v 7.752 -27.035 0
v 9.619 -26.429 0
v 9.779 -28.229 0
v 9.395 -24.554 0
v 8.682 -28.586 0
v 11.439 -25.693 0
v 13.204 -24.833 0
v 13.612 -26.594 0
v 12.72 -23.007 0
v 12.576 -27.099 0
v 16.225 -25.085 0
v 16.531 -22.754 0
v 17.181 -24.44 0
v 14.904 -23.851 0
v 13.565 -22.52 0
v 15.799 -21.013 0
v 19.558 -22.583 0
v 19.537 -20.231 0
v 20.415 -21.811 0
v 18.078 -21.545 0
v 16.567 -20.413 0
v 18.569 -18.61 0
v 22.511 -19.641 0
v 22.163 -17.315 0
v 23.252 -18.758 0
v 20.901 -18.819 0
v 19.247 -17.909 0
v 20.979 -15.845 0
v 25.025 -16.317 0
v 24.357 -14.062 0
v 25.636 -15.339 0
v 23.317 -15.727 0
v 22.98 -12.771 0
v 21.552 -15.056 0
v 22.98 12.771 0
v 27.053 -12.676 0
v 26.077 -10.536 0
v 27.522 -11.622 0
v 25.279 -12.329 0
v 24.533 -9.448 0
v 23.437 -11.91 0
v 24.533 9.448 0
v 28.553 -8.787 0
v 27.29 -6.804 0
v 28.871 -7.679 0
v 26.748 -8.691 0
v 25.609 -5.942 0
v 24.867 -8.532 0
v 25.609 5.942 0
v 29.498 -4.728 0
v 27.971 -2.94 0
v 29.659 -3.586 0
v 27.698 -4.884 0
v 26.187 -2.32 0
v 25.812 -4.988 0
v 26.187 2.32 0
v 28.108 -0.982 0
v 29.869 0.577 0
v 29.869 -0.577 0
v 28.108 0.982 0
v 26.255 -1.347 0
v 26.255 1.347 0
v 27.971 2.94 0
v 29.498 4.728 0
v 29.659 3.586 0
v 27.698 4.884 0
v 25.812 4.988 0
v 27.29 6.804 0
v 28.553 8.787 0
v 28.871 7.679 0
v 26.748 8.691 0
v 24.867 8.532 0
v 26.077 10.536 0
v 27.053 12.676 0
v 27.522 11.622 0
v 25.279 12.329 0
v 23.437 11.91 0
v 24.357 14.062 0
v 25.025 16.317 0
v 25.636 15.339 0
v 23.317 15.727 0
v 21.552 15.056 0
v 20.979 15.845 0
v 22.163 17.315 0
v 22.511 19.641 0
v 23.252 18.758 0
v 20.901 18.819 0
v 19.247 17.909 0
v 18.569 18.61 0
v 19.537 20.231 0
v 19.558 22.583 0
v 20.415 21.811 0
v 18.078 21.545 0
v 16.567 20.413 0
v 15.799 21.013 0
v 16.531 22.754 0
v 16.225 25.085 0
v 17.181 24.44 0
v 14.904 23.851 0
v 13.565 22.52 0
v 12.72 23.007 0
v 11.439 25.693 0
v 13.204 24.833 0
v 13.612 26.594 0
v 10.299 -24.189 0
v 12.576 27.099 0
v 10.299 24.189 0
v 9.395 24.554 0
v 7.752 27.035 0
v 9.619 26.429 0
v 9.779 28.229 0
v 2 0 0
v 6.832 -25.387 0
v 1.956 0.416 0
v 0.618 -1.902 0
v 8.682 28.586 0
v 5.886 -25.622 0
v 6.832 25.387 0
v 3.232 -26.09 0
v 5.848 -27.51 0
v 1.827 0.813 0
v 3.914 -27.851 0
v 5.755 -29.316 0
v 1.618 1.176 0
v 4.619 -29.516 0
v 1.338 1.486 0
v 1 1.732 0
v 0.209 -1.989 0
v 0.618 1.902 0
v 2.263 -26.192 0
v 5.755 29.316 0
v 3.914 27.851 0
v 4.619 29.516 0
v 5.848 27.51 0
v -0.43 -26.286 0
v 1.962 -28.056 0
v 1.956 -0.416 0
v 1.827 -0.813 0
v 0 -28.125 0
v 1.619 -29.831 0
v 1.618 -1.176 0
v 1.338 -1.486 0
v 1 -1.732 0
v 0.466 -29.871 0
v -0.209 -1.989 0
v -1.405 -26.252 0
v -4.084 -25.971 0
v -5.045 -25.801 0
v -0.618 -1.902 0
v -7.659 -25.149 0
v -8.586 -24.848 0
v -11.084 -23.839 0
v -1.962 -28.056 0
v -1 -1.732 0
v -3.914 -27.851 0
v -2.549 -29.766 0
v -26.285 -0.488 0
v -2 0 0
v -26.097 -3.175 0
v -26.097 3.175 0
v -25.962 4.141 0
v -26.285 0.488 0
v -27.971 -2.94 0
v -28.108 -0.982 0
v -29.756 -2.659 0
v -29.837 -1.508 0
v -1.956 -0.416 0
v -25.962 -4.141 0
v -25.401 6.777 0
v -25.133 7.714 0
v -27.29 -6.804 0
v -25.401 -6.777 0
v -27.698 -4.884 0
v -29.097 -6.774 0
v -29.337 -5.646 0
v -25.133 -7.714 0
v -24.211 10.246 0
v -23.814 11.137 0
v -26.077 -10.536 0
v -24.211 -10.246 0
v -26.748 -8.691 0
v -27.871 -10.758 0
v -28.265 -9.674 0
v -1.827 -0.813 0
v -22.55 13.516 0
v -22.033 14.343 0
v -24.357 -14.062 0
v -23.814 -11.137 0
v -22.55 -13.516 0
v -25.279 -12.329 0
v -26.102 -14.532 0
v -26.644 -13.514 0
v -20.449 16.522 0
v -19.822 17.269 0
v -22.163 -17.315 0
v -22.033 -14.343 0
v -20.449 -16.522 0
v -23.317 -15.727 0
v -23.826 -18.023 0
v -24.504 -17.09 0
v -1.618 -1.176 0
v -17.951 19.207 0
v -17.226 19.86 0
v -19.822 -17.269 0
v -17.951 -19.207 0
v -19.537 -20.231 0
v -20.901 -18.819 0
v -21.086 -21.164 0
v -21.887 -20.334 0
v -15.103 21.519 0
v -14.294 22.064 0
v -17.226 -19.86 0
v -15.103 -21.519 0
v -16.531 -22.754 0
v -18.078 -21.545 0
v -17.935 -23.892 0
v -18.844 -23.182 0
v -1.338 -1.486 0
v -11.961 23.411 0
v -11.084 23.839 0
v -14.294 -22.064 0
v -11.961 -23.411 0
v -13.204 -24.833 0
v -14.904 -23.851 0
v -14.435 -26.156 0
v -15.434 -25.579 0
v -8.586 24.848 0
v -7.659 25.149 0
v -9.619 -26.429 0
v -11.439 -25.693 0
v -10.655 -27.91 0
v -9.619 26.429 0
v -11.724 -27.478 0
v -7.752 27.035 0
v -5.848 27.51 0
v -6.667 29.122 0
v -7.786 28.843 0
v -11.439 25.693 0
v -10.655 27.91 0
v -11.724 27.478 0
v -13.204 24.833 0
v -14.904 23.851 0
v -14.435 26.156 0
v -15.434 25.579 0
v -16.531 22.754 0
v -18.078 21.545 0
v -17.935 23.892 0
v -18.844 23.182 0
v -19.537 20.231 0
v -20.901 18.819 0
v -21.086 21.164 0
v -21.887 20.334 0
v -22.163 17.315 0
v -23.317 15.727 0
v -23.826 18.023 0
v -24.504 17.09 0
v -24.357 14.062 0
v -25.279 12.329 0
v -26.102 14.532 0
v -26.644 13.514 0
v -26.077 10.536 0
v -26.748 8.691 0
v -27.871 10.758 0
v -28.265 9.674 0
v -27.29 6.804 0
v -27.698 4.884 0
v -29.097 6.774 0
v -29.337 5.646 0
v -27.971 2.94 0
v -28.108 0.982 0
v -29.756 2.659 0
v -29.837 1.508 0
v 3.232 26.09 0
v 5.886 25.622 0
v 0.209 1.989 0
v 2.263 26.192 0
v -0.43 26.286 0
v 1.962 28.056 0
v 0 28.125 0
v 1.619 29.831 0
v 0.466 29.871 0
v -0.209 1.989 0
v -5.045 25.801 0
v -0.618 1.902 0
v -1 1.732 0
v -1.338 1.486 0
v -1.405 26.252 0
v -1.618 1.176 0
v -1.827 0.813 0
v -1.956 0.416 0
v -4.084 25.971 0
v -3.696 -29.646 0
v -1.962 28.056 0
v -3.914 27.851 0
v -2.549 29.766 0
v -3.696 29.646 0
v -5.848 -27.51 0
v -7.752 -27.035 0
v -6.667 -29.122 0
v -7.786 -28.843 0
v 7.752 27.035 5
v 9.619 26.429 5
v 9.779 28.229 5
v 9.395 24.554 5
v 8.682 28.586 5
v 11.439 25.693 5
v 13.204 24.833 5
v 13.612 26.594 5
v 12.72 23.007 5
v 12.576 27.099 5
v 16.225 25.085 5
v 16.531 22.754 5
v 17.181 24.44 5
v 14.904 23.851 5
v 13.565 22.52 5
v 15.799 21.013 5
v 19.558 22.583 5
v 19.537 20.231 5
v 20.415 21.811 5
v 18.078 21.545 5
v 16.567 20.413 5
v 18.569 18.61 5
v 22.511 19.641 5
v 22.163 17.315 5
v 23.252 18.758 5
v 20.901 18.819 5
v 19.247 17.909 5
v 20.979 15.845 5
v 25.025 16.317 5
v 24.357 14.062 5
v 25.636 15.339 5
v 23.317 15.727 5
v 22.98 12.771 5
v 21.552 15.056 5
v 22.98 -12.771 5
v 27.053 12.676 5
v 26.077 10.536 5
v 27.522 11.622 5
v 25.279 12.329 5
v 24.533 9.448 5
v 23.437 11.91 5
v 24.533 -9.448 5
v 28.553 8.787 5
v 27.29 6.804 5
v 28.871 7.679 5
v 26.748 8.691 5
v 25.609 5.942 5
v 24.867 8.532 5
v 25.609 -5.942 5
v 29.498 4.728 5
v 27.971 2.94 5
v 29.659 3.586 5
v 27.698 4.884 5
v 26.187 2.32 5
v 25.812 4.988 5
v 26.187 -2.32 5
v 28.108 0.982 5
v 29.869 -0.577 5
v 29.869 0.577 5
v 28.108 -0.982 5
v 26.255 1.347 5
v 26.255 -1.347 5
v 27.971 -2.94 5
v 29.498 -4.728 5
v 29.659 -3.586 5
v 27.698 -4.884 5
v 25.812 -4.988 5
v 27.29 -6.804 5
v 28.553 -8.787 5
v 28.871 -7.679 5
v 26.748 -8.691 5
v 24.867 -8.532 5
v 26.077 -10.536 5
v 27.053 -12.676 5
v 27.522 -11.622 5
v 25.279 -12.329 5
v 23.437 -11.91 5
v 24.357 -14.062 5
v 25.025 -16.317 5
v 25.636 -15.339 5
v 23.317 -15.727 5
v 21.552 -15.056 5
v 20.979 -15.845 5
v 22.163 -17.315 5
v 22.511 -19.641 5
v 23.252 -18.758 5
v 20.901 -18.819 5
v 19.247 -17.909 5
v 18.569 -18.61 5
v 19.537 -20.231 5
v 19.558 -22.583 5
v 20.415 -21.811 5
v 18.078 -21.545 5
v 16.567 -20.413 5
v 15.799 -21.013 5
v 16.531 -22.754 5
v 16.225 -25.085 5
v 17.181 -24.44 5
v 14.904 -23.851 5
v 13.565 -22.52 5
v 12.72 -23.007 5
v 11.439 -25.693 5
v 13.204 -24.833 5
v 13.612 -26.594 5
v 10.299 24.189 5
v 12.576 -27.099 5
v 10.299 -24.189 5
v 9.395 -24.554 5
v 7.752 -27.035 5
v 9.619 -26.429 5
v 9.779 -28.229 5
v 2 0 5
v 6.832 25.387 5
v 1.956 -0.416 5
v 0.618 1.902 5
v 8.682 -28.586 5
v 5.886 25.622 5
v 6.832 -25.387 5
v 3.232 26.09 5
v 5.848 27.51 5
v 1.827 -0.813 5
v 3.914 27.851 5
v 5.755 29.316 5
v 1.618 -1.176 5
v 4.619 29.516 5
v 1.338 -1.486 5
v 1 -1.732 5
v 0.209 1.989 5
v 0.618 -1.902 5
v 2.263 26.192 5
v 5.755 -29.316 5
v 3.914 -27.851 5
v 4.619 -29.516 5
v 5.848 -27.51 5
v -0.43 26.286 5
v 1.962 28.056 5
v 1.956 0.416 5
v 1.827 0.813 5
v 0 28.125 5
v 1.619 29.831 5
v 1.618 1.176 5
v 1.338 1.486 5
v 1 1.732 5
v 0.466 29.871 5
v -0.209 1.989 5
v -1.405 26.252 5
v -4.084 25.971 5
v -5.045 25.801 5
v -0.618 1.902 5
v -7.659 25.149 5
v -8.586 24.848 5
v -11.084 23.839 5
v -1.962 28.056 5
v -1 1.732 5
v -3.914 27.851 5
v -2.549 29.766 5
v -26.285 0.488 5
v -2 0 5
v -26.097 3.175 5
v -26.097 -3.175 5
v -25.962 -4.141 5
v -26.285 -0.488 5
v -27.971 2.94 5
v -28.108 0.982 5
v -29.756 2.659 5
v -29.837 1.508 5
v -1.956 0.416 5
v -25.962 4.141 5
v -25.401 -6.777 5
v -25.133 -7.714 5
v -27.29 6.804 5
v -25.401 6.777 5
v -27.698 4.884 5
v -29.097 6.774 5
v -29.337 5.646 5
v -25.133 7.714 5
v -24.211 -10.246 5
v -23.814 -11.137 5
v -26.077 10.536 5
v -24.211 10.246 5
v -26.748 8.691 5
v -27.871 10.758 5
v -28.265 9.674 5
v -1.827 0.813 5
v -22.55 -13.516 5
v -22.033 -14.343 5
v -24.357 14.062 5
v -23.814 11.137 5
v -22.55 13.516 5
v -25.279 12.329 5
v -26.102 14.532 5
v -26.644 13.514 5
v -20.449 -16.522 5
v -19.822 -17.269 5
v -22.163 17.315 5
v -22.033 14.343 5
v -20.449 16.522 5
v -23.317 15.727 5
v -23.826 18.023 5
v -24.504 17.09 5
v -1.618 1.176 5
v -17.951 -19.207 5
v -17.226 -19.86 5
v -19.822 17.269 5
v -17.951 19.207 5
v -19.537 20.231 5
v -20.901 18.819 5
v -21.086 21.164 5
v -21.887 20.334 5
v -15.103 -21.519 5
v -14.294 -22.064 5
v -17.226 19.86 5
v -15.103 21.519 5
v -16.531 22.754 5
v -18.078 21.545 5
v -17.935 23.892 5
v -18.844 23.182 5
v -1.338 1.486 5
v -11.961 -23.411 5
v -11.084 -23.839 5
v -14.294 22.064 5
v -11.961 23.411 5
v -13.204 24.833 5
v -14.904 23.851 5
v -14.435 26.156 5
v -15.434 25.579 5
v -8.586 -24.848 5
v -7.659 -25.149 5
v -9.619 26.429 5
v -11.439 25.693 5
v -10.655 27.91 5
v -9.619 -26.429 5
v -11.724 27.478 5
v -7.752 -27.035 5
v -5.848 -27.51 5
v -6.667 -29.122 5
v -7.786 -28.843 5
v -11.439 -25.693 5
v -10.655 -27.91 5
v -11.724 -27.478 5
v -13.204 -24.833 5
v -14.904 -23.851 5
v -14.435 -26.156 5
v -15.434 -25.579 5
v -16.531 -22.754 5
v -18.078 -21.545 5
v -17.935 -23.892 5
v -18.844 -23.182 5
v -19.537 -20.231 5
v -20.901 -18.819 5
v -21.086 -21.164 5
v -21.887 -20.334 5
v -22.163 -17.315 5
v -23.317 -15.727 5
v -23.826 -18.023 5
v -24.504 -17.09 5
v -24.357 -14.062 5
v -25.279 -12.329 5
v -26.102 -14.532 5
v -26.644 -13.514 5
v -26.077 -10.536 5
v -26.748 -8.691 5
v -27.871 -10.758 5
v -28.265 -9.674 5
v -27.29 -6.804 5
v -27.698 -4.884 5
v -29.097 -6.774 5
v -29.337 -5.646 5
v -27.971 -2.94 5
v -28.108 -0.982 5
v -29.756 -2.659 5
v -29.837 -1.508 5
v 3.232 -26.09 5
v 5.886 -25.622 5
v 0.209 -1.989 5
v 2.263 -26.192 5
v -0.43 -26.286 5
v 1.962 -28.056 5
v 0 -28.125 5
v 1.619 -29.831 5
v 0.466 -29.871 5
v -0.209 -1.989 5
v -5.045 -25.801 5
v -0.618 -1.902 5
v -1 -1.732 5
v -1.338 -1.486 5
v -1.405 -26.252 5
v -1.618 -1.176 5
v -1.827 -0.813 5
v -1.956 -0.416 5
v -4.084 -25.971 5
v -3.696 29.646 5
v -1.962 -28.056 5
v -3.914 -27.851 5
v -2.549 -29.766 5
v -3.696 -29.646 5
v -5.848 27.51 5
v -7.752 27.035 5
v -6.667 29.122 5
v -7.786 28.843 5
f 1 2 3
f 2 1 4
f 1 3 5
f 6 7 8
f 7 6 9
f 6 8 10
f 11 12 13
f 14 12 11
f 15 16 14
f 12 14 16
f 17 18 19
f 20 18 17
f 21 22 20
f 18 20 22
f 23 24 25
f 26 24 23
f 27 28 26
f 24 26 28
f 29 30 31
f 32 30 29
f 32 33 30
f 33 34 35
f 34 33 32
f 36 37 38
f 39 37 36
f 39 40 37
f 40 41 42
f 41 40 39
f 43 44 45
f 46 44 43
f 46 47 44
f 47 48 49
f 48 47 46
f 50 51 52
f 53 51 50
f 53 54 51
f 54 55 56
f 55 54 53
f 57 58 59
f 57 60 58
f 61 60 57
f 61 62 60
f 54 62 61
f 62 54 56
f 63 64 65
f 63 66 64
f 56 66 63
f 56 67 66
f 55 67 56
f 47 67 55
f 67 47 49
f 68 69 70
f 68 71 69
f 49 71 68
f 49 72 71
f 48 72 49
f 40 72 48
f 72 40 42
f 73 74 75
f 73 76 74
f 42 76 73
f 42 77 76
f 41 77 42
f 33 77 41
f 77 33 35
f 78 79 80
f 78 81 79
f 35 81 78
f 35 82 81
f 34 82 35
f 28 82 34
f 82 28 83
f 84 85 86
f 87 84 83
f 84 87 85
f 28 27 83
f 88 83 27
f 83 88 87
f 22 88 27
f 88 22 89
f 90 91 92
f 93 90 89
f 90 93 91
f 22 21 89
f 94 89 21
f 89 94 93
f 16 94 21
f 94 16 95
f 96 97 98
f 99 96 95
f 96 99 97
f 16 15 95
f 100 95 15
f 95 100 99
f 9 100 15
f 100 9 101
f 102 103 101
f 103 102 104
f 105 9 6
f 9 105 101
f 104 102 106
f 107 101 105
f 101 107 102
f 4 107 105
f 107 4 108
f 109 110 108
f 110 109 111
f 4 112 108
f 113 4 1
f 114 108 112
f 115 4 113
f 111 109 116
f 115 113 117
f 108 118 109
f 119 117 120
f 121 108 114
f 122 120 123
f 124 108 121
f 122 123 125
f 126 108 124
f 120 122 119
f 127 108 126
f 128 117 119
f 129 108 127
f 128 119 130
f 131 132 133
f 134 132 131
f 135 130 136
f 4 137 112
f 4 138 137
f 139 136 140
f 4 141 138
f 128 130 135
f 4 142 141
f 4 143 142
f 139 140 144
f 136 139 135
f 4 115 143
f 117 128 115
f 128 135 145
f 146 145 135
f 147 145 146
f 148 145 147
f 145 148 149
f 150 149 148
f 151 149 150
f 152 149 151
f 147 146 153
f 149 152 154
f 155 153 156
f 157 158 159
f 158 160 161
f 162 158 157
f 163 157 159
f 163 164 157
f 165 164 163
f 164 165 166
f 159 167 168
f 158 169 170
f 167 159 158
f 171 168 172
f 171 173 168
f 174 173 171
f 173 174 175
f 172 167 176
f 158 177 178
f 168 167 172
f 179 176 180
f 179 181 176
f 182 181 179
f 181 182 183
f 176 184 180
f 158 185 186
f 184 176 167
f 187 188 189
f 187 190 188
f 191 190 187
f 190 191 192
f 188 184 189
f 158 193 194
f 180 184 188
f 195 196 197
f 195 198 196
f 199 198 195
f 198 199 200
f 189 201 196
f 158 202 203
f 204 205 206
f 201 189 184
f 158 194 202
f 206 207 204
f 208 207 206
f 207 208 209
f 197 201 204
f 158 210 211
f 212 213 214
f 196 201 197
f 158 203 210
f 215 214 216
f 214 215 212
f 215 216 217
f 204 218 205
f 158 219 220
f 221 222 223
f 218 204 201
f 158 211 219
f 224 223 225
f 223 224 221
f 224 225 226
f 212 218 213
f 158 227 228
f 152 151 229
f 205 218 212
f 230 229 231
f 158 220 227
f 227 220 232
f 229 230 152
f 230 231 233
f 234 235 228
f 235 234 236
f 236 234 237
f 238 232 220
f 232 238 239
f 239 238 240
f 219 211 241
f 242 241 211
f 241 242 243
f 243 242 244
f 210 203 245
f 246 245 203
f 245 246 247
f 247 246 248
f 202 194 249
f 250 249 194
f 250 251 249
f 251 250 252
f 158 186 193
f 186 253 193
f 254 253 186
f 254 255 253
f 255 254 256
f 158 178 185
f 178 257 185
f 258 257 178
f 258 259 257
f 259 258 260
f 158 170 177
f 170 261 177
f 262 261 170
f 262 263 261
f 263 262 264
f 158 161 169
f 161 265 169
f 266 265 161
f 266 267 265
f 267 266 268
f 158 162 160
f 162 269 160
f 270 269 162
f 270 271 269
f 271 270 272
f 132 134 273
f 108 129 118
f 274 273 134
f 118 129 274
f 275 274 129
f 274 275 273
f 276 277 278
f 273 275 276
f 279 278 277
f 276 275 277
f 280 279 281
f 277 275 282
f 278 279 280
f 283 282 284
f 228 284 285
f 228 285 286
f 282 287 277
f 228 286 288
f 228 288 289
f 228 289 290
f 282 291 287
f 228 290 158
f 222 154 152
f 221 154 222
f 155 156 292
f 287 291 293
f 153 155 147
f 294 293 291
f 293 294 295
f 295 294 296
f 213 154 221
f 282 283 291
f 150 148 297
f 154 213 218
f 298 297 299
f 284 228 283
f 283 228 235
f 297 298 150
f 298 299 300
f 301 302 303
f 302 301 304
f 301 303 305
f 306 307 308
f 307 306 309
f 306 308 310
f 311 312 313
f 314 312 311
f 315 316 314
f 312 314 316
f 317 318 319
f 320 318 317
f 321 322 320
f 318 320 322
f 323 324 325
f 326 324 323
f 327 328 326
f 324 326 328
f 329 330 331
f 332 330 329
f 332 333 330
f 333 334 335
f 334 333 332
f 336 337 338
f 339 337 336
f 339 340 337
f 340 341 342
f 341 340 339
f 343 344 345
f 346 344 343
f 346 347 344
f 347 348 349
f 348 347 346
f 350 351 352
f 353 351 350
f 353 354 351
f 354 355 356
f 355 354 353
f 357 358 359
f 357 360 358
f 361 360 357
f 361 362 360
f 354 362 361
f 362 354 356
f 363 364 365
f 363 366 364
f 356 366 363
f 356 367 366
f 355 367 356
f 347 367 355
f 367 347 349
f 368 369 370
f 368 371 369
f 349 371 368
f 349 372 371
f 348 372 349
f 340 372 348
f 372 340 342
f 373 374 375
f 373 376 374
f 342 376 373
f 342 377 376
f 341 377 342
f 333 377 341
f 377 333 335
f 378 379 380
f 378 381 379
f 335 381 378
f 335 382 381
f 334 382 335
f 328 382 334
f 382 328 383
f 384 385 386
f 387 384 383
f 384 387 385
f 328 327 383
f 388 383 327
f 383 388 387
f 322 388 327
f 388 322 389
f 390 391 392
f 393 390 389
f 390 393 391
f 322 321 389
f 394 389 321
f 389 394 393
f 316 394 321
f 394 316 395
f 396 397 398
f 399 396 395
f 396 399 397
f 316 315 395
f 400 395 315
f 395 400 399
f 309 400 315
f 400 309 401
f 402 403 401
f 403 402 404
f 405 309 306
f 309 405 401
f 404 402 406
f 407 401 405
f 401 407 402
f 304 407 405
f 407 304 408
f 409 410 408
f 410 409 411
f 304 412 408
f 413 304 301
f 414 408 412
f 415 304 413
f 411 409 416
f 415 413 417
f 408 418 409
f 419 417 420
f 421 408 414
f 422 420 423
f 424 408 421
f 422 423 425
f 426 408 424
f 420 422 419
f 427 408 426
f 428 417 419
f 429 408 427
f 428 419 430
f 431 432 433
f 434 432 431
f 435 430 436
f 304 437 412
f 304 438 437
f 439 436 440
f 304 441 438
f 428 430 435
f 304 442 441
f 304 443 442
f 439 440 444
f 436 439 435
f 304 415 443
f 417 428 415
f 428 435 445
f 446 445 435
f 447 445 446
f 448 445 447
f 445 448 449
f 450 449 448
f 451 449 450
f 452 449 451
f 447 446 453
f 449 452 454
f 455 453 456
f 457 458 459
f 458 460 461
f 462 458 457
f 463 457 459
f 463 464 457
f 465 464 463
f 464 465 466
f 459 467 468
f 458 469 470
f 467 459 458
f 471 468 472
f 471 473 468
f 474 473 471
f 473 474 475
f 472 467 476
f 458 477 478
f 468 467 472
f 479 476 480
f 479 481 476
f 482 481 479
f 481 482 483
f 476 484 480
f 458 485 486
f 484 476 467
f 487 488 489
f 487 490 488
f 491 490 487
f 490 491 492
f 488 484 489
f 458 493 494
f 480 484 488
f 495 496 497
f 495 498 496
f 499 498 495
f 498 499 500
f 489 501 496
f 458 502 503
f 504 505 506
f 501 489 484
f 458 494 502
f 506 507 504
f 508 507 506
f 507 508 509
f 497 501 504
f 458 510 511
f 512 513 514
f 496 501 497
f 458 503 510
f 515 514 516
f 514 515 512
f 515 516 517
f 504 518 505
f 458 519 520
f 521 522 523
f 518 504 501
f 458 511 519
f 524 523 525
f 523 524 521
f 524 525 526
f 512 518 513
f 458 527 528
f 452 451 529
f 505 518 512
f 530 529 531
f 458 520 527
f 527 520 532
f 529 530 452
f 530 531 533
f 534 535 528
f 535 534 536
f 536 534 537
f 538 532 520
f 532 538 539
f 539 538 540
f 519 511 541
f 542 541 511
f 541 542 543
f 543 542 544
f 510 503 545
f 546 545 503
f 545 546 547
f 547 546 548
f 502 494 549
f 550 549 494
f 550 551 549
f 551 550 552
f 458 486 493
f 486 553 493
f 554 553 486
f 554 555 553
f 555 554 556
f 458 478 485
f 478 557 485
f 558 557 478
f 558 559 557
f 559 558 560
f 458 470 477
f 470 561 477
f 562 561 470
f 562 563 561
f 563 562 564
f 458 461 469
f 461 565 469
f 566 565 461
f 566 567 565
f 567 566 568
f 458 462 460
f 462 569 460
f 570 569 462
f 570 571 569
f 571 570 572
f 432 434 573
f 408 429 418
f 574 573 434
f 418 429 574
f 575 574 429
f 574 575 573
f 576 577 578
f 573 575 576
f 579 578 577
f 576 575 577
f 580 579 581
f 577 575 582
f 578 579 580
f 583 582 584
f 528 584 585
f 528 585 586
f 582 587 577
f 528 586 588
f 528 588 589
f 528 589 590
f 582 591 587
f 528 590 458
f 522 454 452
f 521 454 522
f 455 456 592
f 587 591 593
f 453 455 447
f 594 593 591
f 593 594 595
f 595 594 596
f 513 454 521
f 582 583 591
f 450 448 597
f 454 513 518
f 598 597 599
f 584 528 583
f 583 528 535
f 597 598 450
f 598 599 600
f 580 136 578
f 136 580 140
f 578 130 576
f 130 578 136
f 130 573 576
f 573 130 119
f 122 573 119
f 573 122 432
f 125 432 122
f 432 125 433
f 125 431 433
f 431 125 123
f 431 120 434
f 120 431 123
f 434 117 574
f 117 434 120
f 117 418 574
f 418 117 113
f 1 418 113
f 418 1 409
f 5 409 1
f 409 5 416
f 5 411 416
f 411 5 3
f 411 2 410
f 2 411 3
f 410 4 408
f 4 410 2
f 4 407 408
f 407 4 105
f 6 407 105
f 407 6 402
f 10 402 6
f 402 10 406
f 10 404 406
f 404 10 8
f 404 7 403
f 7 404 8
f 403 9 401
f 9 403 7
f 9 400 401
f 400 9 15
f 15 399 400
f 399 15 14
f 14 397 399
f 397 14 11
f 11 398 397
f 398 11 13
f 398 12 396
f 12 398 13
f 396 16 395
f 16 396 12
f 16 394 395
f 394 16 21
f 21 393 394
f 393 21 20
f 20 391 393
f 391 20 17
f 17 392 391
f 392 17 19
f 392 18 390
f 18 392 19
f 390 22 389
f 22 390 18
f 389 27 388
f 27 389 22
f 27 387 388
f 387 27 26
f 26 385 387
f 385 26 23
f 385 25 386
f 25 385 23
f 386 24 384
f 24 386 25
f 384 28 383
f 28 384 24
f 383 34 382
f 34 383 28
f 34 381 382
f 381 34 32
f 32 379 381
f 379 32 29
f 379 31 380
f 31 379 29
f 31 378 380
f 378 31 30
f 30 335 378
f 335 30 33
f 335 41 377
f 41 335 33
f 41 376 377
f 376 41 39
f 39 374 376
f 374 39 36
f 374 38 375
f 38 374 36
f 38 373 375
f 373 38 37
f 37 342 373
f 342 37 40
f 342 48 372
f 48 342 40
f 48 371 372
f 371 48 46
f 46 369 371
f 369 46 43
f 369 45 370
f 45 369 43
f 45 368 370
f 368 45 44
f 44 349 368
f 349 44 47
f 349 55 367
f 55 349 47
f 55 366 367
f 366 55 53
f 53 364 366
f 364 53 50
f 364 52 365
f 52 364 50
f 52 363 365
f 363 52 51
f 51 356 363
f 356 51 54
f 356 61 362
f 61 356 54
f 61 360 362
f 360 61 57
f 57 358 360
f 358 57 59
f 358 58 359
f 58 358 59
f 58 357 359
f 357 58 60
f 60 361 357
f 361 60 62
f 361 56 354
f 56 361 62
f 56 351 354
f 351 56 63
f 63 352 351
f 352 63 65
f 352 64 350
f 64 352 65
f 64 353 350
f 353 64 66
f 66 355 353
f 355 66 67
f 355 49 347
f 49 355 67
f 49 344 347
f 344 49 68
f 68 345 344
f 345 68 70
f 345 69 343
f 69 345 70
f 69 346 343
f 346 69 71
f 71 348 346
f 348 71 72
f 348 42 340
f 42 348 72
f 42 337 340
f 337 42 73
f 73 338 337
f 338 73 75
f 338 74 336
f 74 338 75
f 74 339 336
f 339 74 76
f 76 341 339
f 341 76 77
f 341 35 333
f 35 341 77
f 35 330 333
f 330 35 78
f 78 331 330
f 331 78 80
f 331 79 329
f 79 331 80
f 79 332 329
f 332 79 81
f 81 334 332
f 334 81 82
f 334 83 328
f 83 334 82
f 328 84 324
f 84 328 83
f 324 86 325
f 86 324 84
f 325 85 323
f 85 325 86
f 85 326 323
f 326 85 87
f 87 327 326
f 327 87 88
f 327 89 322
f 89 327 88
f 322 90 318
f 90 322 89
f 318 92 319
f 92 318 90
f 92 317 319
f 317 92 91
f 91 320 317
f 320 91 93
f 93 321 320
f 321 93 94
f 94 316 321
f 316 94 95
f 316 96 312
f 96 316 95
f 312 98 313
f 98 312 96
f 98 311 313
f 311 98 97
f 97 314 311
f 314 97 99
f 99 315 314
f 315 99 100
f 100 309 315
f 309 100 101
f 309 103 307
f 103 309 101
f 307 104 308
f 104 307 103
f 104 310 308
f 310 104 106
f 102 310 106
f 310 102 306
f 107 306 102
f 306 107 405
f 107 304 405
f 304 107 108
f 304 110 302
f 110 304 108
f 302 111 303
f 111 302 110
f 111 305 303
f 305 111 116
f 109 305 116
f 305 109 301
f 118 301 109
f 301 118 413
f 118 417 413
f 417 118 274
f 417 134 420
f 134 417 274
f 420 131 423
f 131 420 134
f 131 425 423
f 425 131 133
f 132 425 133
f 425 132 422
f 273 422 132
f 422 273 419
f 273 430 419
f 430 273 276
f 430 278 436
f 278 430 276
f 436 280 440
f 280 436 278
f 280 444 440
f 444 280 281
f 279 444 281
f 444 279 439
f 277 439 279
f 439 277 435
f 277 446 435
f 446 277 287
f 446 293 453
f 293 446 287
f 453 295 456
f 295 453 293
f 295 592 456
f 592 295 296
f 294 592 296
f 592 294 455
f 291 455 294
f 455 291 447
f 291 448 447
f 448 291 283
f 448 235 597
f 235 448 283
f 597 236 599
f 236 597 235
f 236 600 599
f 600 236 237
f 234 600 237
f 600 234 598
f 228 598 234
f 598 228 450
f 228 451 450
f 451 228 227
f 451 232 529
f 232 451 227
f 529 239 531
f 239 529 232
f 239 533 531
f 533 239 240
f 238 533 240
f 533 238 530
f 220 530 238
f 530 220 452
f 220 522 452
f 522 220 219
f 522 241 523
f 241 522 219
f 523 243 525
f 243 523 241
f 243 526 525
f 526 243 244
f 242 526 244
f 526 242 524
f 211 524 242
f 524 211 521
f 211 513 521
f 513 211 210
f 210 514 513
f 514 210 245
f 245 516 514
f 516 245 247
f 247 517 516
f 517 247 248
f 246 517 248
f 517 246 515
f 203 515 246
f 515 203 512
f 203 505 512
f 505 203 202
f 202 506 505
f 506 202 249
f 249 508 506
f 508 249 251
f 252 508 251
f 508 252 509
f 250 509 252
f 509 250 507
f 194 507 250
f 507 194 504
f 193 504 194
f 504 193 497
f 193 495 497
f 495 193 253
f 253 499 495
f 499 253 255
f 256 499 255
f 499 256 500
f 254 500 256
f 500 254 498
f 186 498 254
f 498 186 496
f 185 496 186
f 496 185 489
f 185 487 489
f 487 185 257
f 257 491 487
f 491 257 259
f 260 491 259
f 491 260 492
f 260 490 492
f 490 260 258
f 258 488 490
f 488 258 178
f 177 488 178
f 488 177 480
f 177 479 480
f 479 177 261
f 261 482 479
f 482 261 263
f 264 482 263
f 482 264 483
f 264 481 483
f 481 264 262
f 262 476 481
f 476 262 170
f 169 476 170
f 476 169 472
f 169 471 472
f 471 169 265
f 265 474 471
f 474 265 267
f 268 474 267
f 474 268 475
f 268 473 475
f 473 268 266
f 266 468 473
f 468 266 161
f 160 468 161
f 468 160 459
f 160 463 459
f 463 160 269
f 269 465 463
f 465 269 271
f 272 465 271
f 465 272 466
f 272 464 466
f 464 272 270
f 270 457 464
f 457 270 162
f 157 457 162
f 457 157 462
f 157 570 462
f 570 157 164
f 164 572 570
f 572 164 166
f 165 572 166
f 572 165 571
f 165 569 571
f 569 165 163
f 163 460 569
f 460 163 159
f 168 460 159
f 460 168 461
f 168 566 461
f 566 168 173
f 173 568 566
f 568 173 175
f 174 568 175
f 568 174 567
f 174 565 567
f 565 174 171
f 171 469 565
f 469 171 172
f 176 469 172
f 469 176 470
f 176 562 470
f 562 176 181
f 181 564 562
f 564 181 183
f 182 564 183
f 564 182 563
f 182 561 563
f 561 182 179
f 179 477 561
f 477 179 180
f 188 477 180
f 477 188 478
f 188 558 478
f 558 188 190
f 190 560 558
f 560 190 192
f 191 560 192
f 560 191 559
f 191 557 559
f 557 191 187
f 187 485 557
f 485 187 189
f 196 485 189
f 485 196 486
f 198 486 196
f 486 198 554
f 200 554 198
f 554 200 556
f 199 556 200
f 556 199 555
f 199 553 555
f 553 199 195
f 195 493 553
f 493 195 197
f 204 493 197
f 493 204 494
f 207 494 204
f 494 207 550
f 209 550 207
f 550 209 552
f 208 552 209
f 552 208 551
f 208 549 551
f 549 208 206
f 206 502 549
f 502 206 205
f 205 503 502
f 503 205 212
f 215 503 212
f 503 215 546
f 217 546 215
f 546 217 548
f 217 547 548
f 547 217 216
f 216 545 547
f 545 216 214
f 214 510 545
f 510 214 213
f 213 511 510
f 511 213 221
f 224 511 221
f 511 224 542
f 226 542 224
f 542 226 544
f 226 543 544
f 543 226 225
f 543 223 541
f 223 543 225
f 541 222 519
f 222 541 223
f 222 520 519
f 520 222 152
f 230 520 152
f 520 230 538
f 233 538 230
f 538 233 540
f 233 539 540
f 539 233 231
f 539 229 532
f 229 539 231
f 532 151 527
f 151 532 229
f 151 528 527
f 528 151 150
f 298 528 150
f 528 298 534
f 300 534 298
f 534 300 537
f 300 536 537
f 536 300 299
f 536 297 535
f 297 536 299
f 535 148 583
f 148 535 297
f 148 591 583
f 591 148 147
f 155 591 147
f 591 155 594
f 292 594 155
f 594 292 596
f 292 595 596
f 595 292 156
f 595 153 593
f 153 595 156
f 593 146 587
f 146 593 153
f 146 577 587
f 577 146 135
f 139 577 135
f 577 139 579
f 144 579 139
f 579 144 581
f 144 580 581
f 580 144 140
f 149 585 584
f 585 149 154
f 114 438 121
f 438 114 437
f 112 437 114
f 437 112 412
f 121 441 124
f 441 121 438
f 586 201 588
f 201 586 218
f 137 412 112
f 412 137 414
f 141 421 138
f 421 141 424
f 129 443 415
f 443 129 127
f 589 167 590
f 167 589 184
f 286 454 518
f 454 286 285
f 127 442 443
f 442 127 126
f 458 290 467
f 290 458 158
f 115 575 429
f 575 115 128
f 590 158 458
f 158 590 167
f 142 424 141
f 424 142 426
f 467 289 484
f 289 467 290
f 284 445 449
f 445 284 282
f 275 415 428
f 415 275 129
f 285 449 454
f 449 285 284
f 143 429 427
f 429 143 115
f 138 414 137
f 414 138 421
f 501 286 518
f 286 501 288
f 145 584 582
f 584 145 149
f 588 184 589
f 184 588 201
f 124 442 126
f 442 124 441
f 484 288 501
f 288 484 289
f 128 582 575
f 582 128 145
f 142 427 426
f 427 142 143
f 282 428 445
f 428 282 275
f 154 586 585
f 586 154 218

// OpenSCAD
/*---------------------------------------------------------\
|     From: Ekobots Innovation Ltda - www.ekobots.com      |
|       by: Juan Sirgado y Antico - www.jsya.com.br        |
|----------------------------------------------------------|
|               Program Gear - 2014/04/10                  |
|               All rights reserved 2014                   |
|---------------------------------------------------------*/
gear();
//---------------------------------------------------------|
module gear
(
   // Gear parameters
   num_teeth = 45,  // Number of teeth
   gearHeight = 5, //Height of the gear    

   // Central Hole
   holes_num = 1,   // Central hole (1-Hole 0-No hole)
   hole_radius = 2, // Radius of central hole

   // Tooth parameters
   circ_pitch = false, // Circular pitch
   diam_pitch = .8,    // Diametral pitch
   pres_angle = 86,    // Pressure angle
   tooth_clear = .1    // Clearance
)
{
   difference() 
	{
   	linear_extrude(height = gearHeight, 
							center = false, 
							convexity = 10, 
							twist = 0) 
		{
         // Make the gear
      	make_gear(number_of_teeth = num_teeth,
        	          circular_pitch = circ_pitch,
        			    diametral_pitch = diam_pitch, 
        			    pressure_angle = pres_angle, 
        			    clearance = tooth_clear);
		}
		if (holes_num > 0) 
 	   {
      // Cut the central hole
      translate([0, 0, -.1]) 
         cylinder(r=hole_radius, h=gearHeight+.2, $fs=0.1);
   	}
   }
}
//---------------------------------------------------------|
module make_gear(number_of_teeth=20,
                 circular_pitch=false, 
                 diametral_pitch=false,
                 pressure_angle=20, 
                 clearance = 1)
{
  if (circular_pitch == false && diametral_pitch == false) 
     echo("ERROR: diametral_pitch and circular_pitch not valid");
  
  //Convert diametrial pitch to our native circular pitch
  circular_pitch = (circular_pitch != false ? circular_pitch : 180 / diametral_pitch);
  
  // Pitch diameter: Diameter of pitch circle.
  pitch_diameter  =  number_of_teeth * circular_pitch / 180;
  pitch_radius = pitch_diameter / 2;
  
  // Base Circle
  base_diameter = pitch_diameter * cos(pressure_angle);
  base_radius = base_diameter / 2;

  // Diametrial pitch: Number of teeth per unit length.
  pitch_diametrial = number_of_teeth / pitch_diameter;

  // Addendum: Radial distance from pitch circle to outside circle.
  addendum = 1.4 / pitch_diametrial;
  
  //Outer Circle
  outer_radius = pitch_radius + addendum;
  outer_diameter = outer_radius * 2;
  
  // Dedendum: Radial distance from pitch circle to root diameter
  dedendum = addendum + clearance;

  // Root diameter: Diameter of bottom of tooth spaces.
  root_radius = pitch_radius - dedendum;
  root_diameter = root_radius * 2;
  
  half_thick_angle = 360 / (4 * number_of_teeth);
  
  union() {
    rotate(half_thick_angle)
      circle($fn=number_of_teeth * 2, r=root_radius * 1.001);
    
    for (i = [1 : number_of_teeth]) 
    {  //for (i = [0])
      rotate([0,0, i * 360 / number_of_teeth]) 
      {
        involute_gear_tooth(pitch_radius = pitch_radius,
                            root_radius = root_radius,
                            base_radius = base_radius,
                            outer_radius = outer_radius,
                            half_thick_angle = half_thick_angle);
      } // end of rotate
    } // end of for
  } // end of union
}
//---------------------------------------------------------|
module involute_gear_tooth(pitch_radius,
                           root_radius,
                           base_radius,
                           outer_radius,
                           half_thick_angle)
{
   pitch_to_base_angle  = involute_intersect_angle( base_radius, pitch_radius );
   outer_to_base_angle = involute_intersect_angle( base_radius, outer_radius );
   
   base1 = 0 - pitch_to_base_angle - half_thick_angle;
   pitch1 = 0 - half_thick_angle;
   outer1 = outer_to_base_angle - pitch_to_base_angle - half_thick_angle;
   
   b1 = polar_to_cartesian([ base1, base_radius ]);
   p1 = polar_to_cartesian([ pitch1, pitch_radius ]);
   o1 = polar_to_cartesian([ outer1, outer_radius ]);
   
   b2 = polar_to_cartesian([ -base1, base_radius ]);
   p2 = polar_to_cartesian([ -pitch1, pitch_radius ]);
   o2 = polar_to_cartesian([ -outer1, outer_radius ]);
   
   pitch_to_root_angle = pitch_to_base_angle - 
                         involute_intersect_angle(base_radius, root_radius );

   // set up values for ( root_radius > base_radius ) case
   root1 = pitch1 - pitch_to_root_angle;   

   r1_t =  polar_to_cartesian([ root1, root_radius ]);
   r2_t =  polar_to_cartesian([ -root1, root_radius ]);
  
   // set up values for ( else ) case
   r1_f =  polar_to_cartesian([ base1, root_radius ]);
   r2_f =  polar_to_cartesian([ -base1, root_radius ]);
  
   if (root_radius > base_radius) 
   {
      polygon( points = [b1, r1_t, p1, o1, o2, p2, r2_t, b2], convexity = 3);
   } 
   else 
   {
      polygon( points = [r1_f, b1, p1, o1, o2, p2, b2, r2_f], convexity = 3);
   }
}
//---------------------------------------------------------|
// Finds the angle of the involute about the base radius 
// at the given distance (radius) from its center
function involute_intersect_angle(base_radius, radius) = 
   sqrt( pow(radius/base_radius,2) - 1);
//---------------------------------------------------------|
// Polar coord [angle, radius] to cartesian coord [x,y]
function polar_to_cartesian(polar) =
   [polar[1]*cos(polar[0]),polar[1]*sin(polar[0])];
//---------------------------------------------------------|
